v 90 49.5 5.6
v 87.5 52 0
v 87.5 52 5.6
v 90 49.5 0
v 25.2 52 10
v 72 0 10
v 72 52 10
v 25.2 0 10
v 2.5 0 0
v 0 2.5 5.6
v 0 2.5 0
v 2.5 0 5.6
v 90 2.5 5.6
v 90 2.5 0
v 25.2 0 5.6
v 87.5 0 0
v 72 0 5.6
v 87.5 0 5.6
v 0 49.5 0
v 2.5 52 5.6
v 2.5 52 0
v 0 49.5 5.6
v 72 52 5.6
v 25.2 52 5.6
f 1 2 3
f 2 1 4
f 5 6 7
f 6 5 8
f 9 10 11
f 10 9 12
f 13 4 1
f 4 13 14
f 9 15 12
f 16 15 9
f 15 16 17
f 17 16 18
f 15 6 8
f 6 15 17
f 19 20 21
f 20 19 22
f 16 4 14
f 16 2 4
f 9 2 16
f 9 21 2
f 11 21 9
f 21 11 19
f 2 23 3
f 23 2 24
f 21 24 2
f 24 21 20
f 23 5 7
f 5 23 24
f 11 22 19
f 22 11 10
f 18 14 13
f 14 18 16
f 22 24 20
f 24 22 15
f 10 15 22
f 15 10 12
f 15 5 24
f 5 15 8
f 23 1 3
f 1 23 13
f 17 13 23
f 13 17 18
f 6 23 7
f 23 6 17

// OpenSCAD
$fn = 32;

// ----------------------------------------------------------------------
// Stepped bar: centerstep, 90 x 52 x 10/5.6 mm
// ----------------------------------------------------------------------

// --- parameters (mm) ---
bar_l = 90;               // bar length, X
bar_w = 52;               // bar width, Y
plate_t = 10;             // thickness of the thick zone, Z
thin_t = 5.6;             // thickness of the thin zone
corner_c = 2.5;           // corner chamfer of the bar
step_cut = 4.4;           // material removed from the thin zone
thick_from = 25.2;        // start of the thick middle zone
thick_to = 72;            // end of the thick middle zone
depth_1 = 4.4;            // depth of cut 1 from the top face
depth_2 = 4.4;            // depth of cut 2 from the top face

profile = [[2.5, 0], [87.5, 0], [90, 2.5], [90, 49.5], [87.5, 52], [2.5, 52], [0, 49.5], [0, 2.5]];  // primary outline, 8 points, counter clockwise
void_1 = [[-1, -1], [25.2, -1], [25.2, 53], [-1, 53]];  // thin left end, 4 points
void_2 = [[72, -1], [91, -1], [91, 53], [72, 53]];  // thin right end, 4 points

// --- the one profile operation ---
difference() {
  linear_extrude(height = plate_t) polygon(points = profile);
  translate([0, 0, plate_t - depth_1])
    linear_extrude(height = depth_1 + 1) polygon(points = void_1);
  translate([0, 0, plate_t - depth_2])
    linear_extrude(height = depth_2 + 1) polygon(points = void_2);
}
